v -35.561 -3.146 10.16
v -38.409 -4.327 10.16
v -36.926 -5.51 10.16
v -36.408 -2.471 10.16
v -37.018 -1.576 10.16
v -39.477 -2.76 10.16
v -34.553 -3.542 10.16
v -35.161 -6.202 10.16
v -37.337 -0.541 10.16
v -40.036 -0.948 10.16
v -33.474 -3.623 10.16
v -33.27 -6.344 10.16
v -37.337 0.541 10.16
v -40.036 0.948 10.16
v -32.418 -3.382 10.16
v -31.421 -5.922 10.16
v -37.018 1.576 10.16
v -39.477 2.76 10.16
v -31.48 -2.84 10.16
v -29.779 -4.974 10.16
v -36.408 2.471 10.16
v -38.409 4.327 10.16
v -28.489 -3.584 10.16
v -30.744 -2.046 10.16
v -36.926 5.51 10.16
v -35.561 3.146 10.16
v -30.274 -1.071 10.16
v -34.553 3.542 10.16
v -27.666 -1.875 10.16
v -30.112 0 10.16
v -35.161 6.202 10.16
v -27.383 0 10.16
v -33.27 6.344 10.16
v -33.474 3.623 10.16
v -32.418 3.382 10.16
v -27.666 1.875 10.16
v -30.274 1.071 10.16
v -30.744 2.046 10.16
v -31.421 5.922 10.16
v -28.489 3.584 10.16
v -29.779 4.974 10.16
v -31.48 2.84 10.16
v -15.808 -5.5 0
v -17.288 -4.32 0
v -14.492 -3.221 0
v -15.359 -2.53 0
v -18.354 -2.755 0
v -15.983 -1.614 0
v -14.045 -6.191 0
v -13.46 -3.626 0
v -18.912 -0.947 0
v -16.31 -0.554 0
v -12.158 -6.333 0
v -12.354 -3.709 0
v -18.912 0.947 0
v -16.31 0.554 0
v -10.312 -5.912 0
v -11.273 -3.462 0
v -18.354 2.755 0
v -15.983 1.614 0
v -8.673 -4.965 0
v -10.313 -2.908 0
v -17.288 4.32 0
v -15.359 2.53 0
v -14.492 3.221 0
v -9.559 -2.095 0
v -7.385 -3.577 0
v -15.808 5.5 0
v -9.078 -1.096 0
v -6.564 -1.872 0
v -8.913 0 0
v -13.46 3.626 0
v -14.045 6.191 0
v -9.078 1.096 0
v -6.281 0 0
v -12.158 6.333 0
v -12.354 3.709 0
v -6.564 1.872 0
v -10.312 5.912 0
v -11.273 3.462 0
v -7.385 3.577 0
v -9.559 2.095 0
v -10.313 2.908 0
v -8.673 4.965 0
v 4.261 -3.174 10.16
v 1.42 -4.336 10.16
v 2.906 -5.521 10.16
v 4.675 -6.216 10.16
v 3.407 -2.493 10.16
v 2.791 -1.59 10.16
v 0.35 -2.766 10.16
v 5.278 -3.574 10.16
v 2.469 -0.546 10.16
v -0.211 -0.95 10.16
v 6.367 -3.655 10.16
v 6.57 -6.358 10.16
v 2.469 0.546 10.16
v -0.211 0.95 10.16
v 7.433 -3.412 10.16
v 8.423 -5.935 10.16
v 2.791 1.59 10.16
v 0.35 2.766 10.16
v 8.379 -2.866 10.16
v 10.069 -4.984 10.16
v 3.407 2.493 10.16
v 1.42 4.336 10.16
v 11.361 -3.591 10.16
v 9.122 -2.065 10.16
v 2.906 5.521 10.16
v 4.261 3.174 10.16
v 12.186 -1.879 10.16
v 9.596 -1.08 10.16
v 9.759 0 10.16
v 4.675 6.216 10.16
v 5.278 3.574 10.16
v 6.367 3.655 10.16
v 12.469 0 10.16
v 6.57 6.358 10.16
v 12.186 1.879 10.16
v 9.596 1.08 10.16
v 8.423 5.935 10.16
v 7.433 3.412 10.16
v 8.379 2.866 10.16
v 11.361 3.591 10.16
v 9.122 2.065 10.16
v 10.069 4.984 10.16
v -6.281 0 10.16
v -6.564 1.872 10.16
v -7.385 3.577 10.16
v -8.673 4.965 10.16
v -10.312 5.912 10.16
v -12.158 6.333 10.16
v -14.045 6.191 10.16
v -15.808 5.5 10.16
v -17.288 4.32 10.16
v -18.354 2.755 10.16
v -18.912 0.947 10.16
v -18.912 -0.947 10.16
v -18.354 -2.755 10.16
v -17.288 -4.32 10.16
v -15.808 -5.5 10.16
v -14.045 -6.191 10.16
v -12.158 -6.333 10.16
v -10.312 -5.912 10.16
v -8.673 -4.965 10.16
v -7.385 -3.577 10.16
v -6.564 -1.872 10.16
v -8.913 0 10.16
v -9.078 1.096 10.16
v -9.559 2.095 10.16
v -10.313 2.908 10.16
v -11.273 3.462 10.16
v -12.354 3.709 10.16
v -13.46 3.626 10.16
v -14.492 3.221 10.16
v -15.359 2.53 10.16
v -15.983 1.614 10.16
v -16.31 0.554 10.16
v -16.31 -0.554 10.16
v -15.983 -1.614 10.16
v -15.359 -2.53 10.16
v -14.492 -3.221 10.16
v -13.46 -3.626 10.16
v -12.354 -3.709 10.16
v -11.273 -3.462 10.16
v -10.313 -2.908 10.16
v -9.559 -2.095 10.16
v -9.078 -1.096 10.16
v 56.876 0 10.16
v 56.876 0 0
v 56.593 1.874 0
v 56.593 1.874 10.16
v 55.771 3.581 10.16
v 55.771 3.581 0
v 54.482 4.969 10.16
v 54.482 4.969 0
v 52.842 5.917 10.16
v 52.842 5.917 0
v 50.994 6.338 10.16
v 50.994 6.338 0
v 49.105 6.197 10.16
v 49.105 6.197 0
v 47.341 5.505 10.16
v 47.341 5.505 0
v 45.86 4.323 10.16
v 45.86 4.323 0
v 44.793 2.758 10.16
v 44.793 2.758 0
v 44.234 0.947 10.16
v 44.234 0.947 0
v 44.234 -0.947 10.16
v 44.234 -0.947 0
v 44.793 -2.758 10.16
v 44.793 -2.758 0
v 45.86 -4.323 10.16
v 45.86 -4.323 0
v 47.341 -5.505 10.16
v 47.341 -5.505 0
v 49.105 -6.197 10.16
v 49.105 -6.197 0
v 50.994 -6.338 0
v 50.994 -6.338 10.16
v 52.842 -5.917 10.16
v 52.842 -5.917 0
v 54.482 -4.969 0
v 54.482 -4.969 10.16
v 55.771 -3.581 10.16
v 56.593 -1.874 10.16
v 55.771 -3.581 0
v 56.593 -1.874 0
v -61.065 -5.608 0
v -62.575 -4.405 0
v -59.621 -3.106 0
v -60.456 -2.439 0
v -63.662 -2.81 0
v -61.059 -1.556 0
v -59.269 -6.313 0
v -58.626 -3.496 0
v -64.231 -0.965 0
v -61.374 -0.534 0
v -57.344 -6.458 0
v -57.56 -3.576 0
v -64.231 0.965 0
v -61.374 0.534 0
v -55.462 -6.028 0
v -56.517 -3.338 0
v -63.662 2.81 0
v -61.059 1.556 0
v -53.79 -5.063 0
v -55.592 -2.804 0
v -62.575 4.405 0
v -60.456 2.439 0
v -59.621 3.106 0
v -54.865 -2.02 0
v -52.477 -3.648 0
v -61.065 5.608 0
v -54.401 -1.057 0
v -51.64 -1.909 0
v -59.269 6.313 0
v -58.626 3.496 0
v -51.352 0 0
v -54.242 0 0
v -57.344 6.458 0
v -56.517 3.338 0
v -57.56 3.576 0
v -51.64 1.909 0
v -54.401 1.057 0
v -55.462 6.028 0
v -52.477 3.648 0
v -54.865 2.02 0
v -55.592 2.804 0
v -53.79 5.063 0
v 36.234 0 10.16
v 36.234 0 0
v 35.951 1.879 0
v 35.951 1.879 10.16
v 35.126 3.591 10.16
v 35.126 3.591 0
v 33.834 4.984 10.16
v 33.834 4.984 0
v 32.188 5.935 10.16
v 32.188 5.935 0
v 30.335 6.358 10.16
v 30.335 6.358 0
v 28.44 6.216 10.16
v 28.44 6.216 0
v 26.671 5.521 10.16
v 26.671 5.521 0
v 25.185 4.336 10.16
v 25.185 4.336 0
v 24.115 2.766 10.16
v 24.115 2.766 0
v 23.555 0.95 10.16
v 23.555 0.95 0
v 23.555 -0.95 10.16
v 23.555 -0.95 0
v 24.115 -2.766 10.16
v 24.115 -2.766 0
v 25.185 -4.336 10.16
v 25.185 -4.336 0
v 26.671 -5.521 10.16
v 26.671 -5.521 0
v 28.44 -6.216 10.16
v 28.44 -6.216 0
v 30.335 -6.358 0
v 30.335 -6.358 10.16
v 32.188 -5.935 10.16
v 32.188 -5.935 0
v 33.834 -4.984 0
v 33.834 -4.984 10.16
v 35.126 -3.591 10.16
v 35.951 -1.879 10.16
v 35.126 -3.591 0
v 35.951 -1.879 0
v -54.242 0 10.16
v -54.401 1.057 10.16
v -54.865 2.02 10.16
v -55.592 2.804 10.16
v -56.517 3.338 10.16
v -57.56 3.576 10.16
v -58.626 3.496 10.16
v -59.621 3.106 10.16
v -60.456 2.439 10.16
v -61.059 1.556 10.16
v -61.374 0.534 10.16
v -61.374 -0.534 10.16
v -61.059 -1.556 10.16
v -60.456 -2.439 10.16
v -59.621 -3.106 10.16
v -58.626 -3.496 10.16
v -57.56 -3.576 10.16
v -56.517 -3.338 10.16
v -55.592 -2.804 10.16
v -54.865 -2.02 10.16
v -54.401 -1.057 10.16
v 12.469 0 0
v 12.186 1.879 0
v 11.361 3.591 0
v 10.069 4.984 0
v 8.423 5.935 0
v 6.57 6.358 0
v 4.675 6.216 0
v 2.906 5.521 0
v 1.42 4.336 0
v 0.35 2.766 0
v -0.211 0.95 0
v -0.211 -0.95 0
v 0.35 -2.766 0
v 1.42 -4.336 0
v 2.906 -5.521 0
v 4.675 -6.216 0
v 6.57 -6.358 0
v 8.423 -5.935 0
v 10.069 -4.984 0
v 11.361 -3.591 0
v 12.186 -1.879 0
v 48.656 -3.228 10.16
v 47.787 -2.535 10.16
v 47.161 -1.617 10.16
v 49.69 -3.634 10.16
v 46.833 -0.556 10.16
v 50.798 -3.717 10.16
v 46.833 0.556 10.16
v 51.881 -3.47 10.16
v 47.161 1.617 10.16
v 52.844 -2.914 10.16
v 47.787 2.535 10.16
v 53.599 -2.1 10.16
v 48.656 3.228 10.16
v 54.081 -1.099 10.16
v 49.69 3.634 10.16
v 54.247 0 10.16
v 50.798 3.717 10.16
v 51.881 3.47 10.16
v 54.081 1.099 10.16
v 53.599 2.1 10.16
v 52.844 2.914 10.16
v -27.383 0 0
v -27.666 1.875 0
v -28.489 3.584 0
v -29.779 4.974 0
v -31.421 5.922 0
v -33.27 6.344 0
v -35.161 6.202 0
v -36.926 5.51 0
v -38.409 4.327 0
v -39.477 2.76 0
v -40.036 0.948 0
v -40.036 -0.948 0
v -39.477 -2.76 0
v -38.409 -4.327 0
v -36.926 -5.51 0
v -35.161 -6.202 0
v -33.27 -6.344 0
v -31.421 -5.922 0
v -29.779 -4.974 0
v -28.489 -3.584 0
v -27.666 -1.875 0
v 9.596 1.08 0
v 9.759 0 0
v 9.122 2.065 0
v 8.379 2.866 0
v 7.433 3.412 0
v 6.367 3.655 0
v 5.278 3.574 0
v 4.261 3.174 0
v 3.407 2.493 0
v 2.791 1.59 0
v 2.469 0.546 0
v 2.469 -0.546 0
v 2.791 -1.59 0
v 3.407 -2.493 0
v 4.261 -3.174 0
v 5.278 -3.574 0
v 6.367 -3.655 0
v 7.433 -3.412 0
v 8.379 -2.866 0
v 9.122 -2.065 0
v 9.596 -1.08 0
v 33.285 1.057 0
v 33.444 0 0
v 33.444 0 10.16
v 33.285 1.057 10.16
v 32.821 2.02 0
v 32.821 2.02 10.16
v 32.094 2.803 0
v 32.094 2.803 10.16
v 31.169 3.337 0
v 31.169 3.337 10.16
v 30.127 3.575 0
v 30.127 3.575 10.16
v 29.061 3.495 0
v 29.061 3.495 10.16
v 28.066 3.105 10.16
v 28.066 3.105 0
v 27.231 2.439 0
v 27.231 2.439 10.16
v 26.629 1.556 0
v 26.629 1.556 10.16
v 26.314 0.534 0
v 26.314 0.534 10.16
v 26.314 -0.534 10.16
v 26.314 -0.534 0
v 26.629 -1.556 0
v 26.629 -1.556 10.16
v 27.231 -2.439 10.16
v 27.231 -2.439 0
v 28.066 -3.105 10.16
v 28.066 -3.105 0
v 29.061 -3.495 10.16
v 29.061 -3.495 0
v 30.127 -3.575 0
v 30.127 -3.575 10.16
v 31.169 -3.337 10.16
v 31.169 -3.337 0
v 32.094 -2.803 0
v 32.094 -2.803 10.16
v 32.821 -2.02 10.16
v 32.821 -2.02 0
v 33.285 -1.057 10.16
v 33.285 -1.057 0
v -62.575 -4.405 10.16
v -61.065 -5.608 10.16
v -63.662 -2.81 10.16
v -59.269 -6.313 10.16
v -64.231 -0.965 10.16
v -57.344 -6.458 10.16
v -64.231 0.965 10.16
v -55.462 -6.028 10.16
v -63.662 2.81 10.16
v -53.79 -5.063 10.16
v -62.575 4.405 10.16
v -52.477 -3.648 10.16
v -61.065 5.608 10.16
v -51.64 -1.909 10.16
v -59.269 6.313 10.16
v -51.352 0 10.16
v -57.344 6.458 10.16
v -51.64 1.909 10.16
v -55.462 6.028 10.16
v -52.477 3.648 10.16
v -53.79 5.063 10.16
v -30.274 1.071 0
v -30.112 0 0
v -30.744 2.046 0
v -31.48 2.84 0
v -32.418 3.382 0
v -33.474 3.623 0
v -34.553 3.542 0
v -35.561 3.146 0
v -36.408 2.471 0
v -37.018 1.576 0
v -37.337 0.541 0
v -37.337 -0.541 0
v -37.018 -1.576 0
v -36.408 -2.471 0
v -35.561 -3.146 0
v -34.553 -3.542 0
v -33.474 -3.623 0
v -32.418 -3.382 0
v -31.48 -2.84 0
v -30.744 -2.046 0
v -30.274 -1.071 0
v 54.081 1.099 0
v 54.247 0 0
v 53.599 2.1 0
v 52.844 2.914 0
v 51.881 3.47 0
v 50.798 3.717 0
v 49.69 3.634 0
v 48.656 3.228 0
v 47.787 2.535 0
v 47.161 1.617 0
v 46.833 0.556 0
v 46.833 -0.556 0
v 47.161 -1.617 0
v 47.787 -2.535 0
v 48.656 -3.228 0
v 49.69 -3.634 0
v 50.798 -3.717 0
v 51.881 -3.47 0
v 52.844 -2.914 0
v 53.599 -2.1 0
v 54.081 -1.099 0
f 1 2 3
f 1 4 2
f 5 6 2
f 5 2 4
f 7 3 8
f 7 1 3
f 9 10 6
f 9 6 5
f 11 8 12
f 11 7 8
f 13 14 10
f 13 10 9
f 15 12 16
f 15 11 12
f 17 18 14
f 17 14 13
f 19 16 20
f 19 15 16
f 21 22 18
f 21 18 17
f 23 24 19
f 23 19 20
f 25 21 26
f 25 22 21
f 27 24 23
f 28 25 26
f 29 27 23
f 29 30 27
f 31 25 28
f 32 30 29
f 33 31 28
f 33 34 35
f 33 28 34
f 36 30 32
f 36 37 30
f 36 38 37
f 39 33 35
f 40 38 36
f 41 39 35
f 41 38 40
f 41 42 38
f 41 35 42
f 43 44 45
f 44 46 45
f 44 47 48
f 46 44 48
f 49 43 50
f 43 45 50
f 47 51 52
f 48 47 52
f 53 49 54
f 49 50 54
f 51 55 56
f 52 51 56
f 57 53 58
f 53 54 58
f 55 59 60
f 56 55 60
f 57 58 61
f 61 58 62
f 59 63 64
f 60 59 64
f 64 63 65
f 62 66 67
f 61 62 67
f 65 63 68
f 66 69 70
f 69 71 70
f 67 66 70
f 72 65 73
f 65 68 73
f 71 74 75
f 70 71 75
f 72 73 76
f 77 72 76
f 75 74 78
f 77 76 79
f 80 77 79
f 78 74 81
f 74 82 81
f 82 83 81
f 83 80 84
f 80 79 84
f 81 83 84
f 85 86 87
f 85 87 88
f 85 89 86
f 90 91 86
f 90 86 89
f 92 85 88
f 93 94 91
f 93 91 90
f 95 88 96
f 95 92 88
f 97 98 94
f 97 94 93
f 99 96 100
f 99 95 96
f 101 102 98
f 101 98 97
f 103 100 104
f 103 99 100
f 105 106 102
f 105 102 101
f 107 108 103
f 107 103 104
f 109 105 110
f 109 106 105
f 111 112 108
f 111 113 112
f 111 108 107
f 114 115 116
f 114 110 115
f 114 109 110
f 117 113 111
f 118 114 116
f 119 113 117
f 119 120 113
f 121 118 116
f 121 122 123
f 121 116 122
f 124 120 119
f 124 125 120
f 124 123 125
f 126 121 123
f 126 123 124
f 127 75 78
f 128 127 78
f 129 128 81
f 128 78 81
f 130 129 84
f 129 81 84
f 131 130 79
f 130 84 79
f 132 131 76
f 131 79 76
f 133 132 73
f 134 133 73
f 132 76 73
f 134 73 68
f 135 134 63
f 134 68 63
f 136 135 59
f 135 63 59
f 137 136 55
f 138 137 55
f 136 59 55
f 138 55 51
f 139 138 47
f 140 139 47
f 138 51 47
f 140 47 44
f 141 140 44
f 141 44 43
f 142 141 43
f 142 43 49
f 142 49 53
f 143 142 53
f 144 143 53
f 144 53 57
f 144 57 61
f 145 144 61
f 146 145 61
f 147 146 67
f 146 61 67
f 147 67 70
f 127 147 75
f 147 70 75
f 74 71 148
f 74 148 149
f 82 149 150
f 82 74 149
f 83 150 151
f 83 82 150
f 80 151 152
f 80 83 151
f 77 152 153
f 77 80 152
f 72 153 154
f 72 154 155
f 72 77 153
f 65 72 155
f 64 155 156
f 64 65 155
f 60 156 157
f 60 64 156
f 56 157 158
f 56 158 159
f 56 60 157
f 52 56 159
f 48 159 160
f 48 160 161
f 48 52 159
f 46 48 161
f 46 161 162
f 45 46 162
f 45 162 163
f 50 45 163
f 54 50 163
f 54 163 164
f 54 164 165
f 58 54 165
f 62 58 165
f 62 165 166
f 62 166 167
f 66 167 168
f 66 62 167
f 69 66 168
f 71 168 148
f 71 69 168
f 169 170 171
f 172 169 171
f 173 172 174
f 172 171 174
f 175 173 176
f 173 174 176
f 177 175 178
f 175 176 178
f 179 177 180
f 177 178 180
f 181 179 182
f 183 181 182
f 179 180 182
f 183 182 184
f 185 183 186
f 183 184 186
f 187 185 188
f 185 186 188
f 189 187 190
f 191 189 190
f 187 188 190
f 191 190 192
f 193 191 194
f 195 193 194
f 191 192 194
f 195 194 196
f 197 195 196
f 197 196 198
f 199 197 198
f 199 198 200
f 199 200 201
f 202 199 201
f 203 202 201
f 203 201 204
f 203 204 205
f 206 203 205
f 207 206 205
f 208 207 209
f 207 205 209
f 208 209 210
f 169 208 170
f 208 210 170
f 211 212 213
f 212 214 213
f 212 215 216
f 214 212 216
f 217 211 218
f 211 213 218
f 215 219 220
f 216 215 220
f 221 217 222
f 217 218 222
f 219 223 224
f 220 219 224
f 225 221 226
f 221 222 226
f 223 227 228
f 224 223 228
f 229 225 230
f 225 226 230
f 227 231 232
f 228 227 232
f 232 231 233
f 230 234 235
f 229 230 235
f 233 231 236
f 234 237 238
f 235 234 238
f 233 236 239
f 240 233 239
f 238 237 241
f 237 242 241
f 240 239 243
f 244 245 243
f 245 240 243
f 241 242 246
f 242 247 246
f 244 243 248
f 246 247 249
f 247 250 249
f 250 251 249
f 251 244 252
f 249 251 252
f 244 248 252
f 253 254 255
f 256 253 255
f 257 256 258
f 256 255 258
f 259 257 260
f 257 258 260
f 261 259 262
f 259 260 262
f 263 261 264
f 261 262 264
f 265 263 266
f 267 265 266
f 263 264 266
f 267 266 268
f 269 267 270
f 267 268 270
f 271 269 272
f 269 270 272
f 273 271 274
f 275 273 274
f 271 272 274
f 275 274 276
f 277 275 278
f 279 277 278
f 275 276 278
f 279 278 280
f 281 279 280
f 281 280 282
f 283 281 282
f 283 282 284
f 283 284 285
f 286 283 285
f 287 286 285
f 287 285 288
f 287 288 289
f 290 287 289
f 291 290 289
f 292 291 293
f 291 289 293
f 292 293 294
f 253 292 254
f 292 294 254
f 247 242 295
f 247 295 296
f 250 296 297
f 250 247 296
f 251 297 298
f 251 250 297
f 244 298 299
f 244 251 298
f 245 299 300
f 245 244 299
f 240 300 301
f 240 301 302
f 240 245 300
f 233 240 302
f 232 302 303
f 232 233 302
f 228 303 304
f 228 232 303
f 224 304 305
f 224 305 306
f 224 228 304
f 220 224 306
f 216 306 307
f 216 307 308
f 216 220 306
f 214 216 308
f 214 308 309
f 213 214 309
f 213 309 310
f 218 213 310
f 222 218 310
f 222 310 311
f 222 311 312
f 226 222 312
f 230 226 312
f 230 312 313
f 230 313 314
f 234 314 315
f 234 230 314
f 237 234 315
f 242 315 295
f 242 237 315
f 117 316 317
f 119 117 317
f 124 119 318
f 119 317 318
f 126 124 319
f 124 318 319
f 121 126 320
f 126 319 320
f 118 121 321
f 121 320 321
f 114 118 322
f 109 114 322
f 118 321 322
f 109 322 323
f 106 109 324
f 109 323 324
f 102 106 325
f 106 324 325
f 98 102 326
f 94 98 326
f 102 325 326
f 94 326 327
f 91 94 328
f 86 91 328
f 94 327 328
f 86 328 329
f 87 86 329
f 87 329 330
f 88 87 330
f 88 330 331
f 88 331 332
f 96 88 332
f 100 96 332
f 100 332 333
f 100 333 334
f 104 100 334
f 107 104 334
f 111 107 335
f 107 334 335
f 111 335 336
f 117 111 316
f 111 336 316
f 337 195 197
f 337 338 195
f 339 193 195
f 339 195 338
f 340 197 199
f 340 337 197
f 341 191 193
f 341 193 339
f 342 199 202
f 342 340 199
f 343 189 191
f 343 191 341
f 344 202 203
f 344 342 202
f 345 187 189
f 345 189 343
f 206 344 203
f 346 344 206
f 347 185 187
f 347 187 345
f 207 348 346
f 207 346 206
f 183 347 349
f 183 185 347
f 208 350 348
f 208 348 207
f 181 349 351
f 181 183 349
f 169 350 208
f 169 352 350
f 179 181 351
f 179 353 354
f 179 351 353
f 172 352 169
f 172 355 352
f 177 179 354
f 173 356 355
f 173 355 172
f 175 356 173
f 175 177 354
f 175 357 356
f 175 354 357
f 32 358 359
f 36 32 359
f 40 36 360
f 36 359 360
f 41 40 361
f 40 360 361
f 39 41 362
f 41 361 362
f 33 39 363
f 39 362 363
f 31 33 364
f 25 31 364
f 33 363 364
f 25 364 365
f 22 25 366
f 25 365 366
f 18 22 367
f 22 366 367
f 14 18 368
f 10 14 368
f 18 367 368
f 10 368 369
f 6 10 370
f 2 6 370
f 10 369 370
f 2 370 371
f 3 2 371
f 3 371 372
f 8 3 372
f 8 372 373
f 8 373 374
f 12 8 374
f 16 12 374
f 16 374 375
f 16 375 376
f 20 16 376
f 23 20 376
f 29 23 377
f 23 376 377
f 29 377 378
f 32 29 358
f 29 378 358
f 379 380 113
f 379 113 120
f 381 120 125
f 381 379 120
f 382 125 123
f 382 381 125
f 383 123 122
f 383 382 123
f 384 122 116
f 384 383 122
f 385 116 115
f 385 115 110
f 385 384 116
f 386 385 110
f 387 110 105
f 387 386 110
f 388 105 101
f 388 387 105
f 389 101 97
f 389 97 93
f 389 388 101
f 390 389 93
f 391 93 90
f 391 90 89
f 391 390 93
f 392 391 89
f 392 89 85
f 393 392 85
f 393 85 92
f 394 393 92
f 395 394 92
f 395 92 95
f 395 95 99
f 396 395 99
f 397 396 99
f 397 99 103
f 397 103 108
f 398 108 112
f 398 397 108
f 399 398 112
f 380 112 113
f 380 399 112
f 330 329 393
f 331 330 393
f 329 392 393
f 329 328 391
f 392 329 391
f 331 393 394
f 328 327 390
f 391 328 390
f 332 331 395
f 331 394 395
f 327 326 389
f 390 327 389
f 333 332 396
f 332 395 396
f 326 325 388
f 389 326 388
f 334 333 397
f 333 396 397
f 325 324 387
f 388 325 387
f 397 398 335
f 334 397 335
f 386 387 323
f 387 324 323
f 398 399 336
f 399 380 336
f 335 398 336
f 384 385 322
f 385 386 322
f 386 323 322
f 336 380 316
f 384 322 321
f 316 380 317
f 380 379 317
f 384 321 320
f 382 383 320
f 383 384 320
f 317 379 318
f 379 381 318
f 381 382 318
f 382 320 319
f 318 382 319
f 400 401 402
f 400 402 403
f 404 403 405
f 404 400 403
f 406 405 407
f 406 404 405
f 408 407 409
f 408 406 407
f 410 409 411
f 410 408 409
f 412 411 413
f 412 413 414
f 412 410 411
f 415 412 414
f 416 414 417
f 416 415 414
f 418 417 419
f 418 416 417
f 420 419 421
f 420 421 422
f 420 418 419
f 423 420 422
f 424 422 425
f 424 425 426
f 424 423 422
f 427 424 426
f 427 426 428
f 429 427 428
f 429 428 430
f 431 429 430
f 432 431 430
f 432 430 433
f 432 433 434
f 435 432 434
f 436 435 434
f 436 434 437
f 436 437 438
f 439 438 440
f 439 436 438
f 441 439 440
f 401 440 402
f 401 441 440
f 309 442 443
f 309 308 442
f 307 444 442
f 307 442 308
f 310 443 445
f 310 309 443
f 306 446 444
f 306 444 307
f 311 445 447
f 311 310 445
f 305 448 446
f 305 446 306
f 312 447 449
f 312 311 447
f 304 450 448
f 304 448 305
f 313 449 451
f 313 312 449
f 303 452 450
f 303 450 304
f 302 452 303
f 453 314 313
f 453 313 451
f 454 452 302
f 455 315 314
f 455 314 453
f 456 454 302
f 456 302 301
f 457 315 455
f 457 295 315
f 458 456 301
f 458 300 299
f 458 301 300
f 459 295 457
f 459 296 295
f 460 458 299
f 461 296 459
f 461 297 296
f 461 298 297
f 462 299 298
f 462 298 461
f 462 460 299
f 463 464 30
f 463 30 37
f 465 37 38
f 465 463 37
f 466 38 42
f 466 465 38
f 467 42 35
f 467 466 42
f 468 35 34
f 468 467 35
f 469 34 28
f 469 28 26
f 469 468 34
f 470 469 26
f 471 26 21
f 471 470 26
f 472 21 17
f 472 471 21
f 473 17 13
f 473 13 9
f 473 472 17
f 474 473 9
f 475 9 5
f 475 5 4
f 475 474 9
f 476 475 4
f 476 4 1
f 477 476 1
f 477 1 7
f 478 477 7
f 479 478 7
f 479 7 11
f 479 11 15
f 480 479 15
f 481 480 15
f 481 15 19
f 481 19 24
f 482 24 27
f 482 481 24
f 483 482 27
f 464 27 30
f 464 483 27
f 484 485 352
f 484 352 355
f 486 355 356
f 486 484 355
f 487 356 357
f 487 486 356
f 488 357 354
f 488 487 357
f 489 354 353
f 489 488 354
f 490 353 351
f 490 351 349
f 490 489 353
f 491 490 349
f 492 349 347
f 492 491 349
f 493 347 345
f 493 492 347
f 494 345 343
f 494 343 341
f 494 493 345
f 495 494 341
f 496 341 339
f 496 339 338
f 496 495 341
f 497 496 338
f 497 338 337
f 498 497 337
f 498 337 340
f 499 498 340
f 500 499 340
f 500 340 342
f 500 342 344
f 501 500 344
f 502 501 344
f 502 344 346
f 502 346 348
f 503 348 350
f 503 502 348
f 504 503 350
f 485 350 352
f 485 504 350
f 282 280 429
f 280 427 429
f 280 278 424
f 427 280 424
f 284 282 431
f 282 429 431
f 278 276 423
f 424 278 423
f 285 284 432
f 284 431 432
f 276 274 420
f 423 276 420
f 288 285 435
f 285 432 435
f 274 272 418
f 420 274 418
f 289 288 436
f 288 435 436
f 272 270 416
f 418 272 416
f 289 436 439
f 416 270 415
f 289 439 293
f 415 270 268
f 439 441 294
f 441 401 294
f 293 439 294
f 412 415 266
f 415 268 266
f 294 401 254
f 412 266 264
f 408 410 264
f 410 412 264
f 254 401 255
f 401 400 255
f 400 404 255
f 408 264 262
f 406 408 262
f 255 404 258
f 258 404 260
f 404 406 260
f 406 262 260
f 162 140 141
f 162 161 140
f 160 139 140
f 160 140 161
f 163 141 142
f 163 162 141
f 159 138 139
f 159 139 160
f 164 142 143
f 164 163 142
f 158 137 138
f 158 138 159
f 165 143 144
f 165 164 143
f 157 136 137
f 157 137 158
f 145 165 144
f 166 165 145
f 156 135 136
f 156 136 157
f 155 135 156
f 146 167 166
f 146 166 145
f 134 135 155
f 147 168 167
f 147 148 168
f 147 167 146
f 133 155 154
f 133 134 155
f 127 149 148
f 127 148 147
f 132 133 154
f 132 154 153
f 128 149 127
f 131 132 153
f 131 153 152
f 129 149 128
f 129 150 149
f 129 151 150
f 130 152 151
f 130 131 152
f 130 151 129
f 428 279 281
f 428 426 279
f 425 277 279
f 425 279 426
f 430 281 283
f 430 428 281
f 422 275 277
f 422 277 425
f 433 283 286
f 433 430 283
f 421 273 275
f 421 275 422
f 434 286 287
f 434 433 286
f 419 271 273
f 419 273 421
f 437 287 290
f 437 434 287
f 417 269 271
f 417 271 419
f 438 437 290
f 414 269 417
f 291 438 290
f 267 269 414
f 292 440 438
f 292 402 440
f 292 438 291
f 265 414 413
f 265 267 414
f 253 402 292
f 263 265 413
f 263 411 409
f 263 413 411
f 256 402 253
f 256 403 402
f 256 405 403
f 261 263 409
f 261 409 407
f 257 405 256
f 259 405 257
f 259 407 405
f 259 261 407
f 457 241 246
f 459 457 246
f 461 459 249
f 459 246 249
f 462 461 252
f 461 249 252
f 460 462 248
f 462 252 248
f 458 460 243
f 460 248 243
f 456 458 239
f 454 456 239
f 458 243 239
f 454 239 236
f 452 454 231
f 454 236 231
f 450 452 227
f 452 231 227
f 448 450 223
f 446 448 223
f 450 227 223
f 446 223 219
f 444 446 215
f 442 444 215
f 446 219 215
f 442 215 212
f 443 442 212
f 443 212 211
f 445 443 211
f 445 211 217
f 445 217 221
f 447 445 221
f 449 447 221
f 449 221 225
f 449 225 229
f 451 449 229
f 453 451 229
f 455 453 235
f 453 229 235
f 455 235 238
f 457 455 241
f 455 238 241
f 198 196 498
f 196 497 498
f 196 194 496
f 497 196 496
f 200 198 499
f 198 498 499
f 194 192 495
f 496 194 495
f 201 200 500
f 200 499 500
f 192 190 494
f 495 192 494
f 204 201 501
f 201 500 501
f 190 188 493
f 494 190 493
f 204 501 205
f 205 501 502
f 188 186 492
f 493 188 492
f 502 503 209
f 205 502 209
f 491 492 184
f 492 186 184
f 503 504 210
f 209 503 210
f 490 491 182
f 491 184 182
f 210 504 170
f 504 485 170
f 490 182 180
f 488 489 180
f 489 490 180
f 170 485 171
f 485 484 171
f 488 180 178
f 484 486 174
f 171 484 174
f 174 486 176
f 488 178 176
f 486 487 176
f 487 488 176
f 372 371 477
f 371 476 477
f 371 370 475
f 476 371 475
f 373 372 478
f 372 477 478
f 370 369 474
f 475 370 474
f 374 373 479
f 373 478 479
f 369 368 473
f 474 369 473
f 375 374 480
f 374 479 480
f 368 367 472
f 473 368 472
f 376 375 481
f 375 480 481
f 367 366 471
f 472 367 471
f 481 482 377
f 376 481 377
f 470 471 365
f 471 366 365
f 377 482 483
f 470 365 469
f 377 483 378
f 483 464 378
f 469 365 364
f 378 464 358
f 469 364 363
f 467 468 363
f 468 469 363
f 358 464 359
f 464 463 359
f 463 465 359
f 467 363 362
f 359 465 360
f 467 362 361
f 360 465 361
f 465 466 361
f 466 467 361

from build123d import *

# Parameters (mm, degrees)
F0_R     = 6.3507220603
F0_R_2   = 3.7192541637
F1_DEPTH = 10.16
F0_R_3   = 6.3619127216
F0_R_4   = 3.6327515113
F0_R_5   = 6.4757284785
F0_R_6   = 3.5860816938
F2_R     = 6.3562234289
F2_R_2   = 3.7276679296
F3_DEPTH = 10.16
F2_R_3   = 6.375345629
F2_R_4   = 3.6654269583
F2_R_5   = 6.3754
F2_R_6   = 3.5851449437


# Not quite as in the source:
# - a feature names something its author has since deleted; it is built from what else it names


with BuildPart() as f1:
    # F0 (on Top) → F1 (new body)
    with BuildSketch(Plane.XY):
        with Locations((-12.6321576536, 0)):
            Circle(F0_R)
        with Locations((-12.6321576536, 0)):
            Circle(F0_R_2, mode=Mode.SUBTRACT)
    extrude(amount=F1_DEPTH)


with BuildPart() as f1b:
    # F0 (on Top) → F1, piece 2 (new body)
    with BuildSketch(Plane.XY):
        with Locations((-33.7451025844, 0)):
            Circle(F0_R_3)
        with Locations((-33.7451025844, 0)):
            Circle(F0_R_4, mode=Mode.SUBTRACT)
    extrude(amount=F1_DEPTH)


with BuildPart() as f1c:
    # F0 (on Top) → F1, piece 3 (new body)
    with BuildSketch(Plane.XY):
        with Locations((-57.8276067972, 0)):
            Circle(F0_R_5)
        with Locations((-57.8276067972, 0)):
            Circle(F0_R_6, mode=Mode.SUBTRACT)
    extrude(amount=F1_DEPTH)


with BuildPart() as f3:
    # F2 (on Top) → F3 (new body)
    with BuildSketch(Plane.XY):
        with Locations((50.5194365978, 0)):
            Circle(F2_R)
        with Locations((50.5194365978, 0)):
            Circle(F2_R_2, mode=Mode.SUBTRACT)
    extrude(amount=F3_DEPTH)


with BuildPart() as f3b:
    # F2 (on Top) → F3, piece 2 (new body)
    with BuildSketch(Plane.XY):
        with Locations((6.093558742, 0)):
            Circle(F2_R_3)
        with Locations((6.093558742, 0)):
            Circle(F2_R_4, mode=Mode.SUBTRACT)
    extrude(amount=F3_DEPTH)


with BuildPart() as f3c:
    # F2 (on Top) → F3, piece 3 (new body)
    with BuildSketch(Plane.XY):
        with Locations((29.8588951446, 0)):
            Circle(F2_R_5)
        with Locations((29.8588951446, 0)):
            Circle(F2_R_6, mode=Mode.SUBTRACT)
    extrude(amount=F3_DEPTH)


solid = Compound([f1.part, f1b.part, f1c.part, f3.part, f3b.part, f3c.part])
